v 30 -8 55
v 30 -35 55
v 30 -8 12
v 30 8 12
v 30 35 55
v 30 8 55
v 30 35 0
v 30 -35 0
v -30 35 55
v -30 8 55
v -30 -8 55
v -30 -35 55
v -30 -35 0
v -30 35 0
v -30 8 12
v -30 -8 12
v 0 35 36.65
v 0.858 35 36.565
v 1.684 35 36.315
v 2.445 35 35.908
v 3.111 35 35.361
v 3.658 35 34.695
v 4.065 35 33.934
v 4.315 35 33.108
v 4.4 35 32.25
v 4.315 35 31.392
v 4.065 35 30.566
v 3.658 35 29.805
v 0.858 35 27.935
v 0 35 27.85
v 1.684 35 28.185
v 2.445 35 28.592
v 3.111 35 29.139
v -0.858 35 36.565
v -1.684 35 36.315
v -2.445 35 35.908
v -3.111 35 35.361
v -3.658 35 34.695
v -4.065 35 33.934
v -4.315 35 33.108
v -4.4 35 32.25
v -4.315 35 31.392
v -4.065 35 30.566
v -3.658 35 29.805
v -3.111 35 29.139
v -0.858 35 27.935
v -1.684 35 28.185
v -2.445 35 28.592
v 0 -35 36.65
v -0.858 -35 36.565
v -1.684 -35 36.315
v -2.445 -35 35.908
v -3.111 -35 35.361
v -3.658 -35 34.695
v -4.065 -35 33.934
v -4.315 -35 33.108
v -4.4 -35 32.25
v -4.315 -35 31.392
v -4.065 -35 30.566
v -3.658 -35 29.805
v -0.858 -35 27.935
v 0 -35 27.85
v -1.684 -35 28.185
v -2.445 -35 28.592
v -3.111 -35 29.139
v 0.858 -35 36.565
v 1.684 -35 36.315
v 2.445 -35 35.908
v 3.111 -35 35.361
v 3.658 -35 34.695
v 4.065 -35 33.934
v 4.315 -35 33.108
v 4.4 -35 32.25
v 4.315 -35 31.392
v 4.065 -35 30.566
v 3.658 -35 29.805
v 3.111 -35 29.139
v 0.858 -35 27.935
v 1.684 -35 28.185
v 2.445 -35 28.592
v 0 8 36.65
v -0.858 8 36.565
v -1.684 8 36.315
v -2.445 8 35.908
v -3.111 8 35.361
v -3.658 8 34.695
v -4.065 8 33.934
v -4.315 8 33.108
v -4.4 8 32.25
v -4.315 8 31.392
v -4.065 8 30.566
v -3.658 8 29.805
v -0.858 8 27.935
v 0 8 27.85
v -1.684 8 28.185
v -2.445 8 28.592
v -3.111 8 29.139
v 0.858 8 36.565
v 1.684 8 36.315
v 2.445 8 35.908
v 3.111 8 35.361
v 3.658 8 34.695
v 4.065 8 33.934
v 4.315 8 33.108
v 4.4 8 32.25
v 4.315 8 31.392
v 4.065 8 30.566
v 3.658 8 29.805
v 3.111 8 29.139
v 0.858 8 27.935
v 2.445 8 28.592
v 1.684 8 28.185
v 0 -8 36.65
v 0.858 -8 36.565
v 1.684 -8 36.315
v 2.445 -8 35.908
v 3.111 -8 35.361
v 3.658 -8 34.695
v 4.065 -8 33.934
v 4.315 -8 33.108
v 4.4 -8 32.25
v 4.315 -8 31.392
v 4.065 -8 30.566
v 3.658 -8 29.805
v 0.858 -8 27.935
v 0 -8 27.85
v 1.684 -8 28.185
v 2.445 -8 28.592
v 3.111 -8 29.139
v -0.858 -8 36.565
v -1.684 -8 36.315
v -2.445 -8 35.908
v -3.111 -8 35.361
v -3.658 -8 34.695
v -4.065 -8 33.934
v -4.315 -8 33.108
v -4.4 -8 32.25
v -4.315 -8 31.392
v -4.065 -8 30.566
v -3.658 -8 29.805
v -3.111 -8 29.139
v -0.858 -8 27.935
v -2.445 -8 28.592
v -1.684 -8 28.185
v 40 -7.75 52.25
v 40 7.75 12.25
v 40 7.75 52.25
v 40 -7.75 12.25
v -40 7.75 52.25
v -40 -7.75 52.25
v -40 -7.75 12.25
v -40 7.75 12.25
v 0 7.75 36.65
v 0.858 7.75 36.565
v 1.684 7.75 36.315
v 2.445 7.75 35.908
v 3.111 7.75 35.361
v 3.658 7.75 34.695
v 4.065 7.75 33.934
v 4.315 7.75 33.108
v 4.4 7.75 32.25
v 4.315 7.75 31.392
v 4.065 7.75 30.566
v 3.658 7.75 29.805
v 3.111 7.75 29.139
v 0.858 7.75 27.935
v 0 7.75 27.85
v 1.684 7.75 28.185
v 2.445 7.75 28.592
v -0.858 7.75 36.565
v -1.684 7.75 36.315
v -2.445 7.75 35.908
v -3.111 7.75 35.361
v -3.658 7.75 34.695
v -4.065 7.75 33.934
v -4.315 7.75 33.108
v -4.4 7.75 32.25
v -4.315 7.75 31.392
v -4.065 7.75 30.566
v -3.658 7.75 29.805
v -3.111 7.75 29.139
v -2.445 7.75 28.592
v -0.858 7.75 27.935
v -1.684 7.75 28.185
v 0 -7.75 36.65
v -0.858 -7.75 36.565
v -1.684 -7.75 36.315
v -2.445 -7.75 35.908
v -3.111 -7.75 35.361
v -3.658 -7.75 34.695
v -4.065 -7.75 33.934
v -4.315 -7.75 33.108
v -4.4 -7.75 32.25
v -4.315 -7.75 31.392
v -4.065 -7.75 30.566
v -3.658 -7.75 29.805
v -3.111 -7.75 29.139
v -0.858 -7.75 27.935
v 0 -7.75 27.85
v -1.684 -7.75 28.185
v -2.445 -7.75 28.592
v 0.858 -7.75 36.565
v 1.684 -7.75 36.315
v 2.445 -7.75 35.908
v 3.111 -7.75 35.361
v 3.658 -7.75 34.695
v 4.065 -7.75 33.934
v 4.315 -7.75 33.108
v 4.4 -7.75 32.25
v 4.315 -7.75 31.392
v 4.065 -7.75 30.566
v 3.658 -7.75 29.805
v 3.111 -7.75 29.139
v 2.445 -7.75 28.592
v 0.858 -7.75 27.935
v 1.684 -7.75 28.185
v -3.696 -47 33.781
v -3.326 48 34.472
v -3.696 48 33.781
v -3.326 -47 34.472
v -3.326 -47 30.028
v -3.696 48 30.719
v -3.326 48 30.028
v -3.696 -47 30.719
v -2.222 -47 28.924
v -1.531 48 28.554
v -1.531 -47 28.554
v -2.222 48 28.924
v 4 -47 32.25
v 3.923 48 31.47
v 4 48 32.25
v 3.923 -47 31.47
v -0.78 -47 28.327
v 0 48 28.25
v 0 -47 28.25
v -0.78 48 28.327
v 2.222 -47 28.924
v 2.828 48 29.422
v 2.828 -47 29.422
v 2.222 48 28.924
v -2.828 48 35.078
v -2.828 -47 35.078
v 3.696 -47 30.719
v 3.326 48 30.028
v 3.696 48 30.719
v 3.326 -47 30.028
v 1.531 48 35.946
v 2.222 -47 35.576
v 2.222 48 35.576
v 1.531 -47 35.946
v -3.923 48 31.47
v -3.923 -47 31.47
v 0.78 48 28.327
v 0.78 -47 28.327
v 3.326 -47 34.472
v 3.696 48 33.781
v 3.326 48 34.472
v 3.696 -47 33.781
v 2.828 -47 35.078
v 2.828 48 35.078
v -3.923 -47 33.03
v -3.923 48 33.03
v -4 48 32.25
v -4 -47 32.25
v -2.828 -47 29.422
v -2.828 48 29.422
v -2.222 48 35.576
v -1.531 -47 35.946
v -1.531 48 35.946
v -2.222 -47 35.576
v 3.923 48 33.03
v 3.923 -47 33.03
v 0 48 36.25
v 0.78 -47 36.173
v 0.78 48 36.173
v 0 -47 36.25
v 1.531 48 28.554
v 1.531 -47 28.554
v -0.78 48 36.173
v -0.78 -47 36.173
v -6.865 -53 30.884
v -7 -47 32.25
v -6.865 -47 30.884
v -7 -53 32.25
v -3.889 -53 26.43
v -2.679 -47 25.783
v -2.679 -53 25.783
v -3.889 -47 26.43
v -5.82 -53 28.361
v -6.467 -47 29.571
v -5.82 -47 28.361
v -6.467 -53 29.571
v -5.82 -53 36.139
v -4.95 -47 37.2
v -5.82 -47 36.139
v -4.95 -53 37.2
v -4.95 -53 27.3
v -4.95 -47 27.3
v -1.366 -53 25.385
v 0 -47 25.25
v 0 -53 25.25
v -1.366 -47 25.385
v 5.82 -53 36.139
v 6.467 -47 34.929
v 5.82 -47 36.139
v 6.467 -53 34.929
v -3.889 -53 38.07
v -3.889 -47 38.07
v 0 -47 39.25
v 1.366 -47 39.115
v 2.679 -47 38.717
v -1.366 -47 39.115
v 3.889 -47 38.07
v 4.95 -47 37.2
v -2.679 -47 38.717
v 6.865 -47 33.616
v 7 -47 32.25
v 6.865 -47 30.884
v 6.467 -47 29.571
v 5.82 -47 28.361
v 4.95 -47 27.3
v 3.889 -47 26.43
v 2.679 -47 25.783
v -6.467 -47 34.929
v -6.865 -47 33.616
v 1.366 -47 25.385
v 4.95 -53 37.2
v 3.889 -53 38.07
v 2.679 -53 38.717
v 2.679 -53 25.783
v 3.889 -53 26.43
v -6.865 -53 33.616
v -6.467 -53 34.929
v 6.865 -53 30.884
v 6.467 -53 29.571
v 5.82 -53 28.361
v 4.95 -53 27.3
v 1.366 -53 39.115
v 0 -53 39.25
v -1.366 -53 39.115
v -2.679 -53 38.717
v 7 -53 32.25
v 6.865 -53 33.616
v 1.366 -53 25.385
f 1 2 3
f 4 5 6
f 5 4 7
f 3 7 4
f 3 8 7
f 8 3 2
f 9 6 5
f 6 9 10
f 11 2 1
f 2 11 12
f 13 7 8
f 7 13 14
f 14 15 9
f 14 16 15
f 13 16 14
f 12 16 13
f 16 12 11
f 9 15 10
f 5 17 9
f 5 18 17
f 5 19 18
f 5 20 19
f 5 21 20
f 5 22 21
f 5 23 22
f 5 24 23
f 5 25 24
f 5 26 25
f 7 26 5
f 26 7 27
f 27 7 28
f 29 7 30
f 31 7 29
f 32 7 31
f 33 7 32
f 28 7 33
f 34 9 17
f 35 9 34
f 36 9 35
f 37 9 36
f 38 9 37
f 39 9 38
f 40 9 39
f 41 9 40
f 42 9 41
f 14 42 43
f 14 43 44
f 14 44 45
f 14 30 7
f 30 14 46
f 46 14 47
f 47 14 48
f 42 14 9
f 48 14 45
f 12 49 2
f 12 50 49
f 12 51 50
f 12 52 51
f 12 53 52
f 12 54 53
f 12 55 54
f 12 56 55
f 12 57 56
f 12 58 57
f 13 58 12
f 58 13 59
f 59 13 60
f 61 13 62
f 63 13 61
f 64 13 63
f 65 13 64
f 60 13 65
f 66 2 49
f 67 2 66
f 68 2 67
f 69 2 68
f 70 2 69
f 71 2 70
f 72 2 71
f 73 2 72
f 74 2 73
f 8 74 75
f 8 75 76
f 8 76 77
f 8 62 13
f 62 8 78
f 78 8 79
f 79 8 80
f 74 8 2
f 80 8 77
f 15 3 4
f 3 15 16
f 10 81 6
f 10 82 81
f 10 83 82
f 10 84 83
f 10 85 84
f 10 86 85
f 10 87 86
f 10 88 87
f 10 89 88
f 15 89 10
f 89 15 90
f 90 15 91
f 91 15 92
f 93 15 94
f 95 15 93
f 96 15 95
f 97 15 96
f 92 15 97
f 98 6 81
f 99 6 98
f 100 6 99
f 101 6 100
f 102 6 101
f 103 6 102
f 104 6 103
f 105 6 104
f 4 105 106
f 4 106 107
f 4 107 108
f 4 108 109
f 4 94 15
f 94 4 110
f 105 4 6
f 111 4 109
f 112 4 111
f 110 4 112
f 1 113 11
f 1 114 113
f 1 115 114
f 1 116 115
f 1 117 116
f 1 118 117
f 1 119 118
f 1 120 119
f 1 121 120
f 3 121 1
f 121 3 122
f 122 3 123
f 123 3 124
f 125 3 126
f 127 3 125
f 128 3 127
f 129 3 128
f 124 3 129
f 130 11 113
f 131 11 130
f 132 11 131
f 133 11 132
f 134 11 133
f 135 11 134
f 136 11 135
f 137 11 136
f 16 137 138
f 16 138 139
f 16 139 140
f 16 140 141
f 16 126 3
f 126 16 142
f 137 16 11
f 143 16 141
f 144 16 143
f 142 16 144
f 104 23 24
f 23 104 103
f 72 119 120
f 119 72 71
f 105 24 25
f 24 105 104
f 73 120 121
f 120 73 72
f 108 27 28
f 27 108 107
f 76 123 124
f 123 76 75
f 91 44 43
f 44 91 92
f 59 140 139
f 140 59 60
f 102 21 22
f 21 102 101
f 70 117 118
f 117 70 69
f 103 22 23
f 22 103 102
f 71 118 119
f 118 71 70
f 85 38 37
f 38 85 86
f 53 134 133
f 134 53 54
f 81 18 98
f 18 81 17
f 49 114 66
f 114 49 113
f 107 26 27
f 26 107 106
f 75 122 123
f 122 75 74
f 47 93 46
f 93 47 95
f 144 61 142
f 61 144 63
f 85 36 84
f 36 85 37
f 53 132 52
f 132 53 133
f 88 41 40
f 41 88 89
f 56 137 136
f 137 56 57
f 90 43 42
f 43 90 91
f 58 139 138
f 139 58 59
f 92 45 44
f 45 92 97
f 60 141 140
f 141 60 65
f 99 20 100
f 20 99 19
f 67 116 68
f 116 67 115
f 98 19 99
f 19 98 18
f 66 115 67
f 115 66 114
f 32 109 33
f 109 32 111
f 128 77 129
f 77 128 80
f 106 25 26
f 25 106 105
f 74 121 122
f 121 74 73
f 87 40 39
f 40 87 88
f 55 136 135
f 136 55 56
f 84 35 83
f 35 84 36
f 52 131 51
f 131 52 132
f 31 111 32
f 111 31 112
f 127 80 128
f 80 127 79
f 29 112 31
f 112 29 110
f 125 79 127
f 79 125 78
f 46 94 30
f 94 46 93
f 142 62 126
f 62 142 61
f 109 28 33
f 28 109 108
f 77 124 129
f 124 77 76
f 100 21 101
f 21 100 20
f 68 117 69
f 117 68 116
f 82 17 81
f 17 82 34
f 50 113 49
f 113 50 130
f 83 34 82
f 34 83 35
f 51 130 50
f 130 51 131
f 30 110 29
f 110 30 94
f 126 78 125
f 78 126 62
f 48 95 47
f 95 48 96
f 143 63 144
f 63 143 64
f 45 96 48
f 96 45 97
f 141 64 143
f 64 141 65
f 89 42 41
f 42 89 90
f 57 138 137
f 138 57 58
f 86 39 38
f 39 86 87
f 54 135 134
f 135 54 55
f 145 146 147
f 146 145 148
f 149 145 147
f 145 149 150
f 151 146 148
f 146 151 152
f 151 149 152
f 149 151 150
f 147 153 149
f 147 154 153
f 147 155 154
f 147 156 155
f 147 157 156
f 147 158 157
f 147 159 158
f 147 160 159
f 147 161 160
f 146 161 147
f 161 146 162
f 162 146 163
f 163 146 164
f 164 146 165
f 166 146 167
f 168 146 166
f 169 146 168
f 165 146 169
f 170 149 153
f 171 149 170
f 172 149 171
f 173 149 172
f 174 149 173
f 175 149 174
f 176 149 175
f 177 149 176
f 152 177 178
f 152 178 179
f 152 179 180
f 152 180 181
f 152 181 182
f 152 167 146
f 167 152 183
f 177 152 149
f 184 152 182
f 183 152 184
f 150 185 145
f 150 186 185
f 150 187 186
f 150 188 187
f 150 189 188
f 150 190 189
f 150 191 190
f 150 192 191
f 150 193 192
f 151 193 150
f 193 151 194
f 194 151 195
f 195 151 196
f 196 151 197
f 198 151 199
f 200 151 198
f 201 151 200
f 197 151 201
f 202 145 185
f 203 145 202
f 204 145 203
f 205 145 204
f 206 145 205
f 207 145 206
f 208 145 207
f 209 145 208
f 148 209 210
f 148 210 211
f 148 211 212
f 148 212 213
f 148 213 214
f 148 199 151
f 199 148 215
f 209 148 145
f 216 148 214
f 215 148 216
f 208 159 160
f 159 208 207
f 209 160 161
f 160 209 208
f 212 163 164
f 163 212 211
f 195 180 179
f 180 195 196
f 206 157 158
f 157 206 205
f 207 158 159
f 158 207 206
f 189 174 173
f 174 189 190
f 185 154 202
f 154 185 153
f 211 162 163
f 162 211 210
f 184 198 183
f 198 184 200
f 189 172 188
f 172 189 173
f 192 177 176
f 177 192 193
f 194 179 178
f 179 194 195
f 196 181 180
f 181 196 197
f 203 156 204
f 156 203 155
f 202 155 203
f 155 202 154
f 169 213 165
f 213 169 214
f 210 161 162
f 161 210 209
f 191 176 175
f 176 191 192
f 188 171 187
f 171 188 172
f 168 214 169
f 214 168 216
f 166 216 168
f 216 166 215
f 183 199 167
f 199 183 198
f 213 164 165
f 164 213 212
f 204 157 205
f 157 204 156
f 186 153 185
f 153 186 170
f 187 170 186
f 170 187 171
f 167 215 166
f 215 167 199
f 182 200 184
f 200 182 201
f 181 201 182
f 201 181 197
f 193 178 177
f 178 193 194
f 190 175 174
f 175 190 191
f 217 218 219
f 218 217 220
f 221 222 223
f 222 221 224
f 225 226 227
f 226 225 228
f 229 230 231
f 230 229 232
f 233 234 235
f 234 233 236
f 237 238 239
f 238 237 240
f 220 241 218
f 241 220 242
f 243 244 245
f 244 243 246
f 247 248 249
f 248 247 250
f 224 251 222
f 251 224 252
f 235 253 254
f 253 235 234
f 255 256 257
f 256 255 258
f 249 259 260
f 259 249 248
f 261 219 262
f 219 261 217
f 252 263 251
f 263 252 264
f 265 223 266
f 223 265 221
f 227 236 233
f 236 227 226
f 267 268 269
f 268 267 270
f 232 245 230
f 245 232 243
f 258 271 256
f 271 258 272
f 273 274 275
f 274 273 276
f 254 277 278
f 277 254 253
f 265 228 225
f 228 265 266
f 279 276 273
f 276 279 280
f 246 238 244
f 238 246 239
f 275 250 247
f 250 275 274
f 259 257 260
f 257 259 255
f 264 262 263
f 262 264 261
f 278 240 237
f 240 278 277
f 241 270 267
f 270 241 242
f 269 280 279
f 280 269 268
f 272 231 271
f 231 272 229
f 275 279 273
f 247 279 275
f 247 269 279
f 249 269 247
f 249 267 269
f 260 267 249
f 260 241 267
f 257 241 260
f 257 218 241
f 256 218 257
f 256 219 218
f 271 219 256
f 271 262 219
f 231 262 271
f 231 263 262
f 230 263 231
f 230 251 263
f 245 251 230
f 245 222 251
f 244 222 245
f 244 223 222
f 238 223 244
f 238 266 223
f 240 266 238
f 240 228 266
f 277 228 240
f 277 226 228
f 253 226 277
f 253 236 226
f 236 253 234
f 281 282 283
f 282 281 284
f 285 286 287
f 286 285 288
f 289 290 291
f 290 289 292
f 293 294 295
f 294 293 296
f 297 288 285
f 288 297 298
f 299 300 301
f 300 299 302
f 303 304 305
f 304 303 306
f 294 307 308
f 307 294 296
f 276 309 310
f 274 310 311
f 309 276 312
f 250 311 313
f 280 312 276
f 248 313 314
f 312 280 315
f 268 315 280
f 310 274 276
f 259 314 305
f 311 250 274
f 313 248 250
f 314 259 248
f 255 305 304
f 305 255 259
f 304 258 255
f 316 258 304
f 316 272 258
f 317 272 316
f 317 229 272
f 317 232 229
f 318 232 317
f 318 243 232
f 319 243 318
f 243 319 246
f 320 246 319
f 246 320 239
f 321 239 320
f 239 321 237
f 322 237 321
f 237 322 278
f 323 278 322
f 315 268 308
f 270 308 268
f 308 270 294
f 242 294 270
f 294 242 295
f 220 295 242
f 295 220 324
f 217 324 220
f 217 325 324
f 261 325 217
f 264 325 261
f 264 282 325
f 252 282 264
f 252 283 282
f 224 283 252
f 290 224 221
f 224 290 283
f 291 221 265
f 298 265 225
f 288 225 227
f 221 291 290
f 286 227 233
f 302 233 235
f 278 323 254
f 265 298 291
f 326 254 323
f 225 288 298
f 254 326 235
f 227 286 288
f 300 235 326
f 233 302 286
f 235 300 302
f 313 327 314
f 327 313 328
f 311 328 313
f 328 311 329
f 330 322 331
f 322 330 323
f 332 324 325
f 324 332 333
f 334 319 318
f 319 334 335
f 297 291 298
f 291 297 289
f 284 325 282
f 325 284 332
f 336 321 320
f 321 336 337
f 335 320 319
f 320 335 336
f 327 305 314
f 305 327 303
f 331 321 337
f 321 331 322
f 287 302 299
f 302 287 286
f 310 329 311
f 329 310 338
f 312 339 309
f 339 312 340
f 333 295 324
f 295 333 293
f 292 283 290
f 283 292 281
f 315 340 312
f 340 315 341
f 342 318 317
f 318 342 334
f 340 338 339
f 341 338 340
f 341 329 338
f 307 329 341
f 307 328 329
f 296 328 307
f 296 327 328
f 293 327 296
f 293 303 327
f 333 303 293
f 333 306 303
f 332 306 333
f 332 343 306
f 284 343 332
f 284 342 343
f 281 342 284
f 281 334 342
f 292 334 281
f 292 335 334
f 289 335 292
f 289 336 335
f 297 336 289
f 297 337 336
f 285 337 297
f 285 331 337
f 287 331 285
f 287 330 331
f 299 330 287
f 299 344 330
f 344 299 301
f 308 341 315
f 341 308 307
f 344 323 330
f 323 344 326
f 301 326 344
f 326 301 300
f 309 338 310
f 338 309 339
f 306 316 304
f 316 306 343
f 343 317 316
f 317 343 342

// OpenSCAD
$fn = 32;

// ------------------------------------------------------------------------
// Clevis joint: 60 mm clevis, pin d8
// Every part is its own module, assembly() places them once.
// ------------------------------------------------------------------------

// --- part 1 ---
module clevis() {
  difference() {
    translate([-30, -35, 0]) cube([60, 70, 55]);
    translate([-31, -8, 12]) cube([62, 16, 44]);
    translate([0, 0, 32.25]) rotate([90, 0, 0]) cylinder(h = 72, d = 8.8, center = true);
  }
}

// --- part 2 ---
module eye() {
  difference() {
    translate([-40, -7.75, 0]) cube([80, 15.5, 40]);
    translate([0, 0, 20]) rotate([90, 0, 0]) cylinder(h = 17.5, d = 8.8, center = true);
  }
}

// --- part 3 ---
module pin() {
  rotate([0, 90, 0]) cylinder(h = 96, d = 8, center = true);
  translate([-53, 0, 0]) rotate([0, 90, 0]) cylinder(h = 6, d = 14);
}

// --- assembly ---
module assembly() {
  translate([0, 0, 0]) rotate([0, 0, 0]) clevis();
  translate([0, 0, 12.25]) rotate([0, 0, 0]) eye();
  translate([0, 0, 32.25]) rotate([0, 0, 90]) pin();
}

assembly();
